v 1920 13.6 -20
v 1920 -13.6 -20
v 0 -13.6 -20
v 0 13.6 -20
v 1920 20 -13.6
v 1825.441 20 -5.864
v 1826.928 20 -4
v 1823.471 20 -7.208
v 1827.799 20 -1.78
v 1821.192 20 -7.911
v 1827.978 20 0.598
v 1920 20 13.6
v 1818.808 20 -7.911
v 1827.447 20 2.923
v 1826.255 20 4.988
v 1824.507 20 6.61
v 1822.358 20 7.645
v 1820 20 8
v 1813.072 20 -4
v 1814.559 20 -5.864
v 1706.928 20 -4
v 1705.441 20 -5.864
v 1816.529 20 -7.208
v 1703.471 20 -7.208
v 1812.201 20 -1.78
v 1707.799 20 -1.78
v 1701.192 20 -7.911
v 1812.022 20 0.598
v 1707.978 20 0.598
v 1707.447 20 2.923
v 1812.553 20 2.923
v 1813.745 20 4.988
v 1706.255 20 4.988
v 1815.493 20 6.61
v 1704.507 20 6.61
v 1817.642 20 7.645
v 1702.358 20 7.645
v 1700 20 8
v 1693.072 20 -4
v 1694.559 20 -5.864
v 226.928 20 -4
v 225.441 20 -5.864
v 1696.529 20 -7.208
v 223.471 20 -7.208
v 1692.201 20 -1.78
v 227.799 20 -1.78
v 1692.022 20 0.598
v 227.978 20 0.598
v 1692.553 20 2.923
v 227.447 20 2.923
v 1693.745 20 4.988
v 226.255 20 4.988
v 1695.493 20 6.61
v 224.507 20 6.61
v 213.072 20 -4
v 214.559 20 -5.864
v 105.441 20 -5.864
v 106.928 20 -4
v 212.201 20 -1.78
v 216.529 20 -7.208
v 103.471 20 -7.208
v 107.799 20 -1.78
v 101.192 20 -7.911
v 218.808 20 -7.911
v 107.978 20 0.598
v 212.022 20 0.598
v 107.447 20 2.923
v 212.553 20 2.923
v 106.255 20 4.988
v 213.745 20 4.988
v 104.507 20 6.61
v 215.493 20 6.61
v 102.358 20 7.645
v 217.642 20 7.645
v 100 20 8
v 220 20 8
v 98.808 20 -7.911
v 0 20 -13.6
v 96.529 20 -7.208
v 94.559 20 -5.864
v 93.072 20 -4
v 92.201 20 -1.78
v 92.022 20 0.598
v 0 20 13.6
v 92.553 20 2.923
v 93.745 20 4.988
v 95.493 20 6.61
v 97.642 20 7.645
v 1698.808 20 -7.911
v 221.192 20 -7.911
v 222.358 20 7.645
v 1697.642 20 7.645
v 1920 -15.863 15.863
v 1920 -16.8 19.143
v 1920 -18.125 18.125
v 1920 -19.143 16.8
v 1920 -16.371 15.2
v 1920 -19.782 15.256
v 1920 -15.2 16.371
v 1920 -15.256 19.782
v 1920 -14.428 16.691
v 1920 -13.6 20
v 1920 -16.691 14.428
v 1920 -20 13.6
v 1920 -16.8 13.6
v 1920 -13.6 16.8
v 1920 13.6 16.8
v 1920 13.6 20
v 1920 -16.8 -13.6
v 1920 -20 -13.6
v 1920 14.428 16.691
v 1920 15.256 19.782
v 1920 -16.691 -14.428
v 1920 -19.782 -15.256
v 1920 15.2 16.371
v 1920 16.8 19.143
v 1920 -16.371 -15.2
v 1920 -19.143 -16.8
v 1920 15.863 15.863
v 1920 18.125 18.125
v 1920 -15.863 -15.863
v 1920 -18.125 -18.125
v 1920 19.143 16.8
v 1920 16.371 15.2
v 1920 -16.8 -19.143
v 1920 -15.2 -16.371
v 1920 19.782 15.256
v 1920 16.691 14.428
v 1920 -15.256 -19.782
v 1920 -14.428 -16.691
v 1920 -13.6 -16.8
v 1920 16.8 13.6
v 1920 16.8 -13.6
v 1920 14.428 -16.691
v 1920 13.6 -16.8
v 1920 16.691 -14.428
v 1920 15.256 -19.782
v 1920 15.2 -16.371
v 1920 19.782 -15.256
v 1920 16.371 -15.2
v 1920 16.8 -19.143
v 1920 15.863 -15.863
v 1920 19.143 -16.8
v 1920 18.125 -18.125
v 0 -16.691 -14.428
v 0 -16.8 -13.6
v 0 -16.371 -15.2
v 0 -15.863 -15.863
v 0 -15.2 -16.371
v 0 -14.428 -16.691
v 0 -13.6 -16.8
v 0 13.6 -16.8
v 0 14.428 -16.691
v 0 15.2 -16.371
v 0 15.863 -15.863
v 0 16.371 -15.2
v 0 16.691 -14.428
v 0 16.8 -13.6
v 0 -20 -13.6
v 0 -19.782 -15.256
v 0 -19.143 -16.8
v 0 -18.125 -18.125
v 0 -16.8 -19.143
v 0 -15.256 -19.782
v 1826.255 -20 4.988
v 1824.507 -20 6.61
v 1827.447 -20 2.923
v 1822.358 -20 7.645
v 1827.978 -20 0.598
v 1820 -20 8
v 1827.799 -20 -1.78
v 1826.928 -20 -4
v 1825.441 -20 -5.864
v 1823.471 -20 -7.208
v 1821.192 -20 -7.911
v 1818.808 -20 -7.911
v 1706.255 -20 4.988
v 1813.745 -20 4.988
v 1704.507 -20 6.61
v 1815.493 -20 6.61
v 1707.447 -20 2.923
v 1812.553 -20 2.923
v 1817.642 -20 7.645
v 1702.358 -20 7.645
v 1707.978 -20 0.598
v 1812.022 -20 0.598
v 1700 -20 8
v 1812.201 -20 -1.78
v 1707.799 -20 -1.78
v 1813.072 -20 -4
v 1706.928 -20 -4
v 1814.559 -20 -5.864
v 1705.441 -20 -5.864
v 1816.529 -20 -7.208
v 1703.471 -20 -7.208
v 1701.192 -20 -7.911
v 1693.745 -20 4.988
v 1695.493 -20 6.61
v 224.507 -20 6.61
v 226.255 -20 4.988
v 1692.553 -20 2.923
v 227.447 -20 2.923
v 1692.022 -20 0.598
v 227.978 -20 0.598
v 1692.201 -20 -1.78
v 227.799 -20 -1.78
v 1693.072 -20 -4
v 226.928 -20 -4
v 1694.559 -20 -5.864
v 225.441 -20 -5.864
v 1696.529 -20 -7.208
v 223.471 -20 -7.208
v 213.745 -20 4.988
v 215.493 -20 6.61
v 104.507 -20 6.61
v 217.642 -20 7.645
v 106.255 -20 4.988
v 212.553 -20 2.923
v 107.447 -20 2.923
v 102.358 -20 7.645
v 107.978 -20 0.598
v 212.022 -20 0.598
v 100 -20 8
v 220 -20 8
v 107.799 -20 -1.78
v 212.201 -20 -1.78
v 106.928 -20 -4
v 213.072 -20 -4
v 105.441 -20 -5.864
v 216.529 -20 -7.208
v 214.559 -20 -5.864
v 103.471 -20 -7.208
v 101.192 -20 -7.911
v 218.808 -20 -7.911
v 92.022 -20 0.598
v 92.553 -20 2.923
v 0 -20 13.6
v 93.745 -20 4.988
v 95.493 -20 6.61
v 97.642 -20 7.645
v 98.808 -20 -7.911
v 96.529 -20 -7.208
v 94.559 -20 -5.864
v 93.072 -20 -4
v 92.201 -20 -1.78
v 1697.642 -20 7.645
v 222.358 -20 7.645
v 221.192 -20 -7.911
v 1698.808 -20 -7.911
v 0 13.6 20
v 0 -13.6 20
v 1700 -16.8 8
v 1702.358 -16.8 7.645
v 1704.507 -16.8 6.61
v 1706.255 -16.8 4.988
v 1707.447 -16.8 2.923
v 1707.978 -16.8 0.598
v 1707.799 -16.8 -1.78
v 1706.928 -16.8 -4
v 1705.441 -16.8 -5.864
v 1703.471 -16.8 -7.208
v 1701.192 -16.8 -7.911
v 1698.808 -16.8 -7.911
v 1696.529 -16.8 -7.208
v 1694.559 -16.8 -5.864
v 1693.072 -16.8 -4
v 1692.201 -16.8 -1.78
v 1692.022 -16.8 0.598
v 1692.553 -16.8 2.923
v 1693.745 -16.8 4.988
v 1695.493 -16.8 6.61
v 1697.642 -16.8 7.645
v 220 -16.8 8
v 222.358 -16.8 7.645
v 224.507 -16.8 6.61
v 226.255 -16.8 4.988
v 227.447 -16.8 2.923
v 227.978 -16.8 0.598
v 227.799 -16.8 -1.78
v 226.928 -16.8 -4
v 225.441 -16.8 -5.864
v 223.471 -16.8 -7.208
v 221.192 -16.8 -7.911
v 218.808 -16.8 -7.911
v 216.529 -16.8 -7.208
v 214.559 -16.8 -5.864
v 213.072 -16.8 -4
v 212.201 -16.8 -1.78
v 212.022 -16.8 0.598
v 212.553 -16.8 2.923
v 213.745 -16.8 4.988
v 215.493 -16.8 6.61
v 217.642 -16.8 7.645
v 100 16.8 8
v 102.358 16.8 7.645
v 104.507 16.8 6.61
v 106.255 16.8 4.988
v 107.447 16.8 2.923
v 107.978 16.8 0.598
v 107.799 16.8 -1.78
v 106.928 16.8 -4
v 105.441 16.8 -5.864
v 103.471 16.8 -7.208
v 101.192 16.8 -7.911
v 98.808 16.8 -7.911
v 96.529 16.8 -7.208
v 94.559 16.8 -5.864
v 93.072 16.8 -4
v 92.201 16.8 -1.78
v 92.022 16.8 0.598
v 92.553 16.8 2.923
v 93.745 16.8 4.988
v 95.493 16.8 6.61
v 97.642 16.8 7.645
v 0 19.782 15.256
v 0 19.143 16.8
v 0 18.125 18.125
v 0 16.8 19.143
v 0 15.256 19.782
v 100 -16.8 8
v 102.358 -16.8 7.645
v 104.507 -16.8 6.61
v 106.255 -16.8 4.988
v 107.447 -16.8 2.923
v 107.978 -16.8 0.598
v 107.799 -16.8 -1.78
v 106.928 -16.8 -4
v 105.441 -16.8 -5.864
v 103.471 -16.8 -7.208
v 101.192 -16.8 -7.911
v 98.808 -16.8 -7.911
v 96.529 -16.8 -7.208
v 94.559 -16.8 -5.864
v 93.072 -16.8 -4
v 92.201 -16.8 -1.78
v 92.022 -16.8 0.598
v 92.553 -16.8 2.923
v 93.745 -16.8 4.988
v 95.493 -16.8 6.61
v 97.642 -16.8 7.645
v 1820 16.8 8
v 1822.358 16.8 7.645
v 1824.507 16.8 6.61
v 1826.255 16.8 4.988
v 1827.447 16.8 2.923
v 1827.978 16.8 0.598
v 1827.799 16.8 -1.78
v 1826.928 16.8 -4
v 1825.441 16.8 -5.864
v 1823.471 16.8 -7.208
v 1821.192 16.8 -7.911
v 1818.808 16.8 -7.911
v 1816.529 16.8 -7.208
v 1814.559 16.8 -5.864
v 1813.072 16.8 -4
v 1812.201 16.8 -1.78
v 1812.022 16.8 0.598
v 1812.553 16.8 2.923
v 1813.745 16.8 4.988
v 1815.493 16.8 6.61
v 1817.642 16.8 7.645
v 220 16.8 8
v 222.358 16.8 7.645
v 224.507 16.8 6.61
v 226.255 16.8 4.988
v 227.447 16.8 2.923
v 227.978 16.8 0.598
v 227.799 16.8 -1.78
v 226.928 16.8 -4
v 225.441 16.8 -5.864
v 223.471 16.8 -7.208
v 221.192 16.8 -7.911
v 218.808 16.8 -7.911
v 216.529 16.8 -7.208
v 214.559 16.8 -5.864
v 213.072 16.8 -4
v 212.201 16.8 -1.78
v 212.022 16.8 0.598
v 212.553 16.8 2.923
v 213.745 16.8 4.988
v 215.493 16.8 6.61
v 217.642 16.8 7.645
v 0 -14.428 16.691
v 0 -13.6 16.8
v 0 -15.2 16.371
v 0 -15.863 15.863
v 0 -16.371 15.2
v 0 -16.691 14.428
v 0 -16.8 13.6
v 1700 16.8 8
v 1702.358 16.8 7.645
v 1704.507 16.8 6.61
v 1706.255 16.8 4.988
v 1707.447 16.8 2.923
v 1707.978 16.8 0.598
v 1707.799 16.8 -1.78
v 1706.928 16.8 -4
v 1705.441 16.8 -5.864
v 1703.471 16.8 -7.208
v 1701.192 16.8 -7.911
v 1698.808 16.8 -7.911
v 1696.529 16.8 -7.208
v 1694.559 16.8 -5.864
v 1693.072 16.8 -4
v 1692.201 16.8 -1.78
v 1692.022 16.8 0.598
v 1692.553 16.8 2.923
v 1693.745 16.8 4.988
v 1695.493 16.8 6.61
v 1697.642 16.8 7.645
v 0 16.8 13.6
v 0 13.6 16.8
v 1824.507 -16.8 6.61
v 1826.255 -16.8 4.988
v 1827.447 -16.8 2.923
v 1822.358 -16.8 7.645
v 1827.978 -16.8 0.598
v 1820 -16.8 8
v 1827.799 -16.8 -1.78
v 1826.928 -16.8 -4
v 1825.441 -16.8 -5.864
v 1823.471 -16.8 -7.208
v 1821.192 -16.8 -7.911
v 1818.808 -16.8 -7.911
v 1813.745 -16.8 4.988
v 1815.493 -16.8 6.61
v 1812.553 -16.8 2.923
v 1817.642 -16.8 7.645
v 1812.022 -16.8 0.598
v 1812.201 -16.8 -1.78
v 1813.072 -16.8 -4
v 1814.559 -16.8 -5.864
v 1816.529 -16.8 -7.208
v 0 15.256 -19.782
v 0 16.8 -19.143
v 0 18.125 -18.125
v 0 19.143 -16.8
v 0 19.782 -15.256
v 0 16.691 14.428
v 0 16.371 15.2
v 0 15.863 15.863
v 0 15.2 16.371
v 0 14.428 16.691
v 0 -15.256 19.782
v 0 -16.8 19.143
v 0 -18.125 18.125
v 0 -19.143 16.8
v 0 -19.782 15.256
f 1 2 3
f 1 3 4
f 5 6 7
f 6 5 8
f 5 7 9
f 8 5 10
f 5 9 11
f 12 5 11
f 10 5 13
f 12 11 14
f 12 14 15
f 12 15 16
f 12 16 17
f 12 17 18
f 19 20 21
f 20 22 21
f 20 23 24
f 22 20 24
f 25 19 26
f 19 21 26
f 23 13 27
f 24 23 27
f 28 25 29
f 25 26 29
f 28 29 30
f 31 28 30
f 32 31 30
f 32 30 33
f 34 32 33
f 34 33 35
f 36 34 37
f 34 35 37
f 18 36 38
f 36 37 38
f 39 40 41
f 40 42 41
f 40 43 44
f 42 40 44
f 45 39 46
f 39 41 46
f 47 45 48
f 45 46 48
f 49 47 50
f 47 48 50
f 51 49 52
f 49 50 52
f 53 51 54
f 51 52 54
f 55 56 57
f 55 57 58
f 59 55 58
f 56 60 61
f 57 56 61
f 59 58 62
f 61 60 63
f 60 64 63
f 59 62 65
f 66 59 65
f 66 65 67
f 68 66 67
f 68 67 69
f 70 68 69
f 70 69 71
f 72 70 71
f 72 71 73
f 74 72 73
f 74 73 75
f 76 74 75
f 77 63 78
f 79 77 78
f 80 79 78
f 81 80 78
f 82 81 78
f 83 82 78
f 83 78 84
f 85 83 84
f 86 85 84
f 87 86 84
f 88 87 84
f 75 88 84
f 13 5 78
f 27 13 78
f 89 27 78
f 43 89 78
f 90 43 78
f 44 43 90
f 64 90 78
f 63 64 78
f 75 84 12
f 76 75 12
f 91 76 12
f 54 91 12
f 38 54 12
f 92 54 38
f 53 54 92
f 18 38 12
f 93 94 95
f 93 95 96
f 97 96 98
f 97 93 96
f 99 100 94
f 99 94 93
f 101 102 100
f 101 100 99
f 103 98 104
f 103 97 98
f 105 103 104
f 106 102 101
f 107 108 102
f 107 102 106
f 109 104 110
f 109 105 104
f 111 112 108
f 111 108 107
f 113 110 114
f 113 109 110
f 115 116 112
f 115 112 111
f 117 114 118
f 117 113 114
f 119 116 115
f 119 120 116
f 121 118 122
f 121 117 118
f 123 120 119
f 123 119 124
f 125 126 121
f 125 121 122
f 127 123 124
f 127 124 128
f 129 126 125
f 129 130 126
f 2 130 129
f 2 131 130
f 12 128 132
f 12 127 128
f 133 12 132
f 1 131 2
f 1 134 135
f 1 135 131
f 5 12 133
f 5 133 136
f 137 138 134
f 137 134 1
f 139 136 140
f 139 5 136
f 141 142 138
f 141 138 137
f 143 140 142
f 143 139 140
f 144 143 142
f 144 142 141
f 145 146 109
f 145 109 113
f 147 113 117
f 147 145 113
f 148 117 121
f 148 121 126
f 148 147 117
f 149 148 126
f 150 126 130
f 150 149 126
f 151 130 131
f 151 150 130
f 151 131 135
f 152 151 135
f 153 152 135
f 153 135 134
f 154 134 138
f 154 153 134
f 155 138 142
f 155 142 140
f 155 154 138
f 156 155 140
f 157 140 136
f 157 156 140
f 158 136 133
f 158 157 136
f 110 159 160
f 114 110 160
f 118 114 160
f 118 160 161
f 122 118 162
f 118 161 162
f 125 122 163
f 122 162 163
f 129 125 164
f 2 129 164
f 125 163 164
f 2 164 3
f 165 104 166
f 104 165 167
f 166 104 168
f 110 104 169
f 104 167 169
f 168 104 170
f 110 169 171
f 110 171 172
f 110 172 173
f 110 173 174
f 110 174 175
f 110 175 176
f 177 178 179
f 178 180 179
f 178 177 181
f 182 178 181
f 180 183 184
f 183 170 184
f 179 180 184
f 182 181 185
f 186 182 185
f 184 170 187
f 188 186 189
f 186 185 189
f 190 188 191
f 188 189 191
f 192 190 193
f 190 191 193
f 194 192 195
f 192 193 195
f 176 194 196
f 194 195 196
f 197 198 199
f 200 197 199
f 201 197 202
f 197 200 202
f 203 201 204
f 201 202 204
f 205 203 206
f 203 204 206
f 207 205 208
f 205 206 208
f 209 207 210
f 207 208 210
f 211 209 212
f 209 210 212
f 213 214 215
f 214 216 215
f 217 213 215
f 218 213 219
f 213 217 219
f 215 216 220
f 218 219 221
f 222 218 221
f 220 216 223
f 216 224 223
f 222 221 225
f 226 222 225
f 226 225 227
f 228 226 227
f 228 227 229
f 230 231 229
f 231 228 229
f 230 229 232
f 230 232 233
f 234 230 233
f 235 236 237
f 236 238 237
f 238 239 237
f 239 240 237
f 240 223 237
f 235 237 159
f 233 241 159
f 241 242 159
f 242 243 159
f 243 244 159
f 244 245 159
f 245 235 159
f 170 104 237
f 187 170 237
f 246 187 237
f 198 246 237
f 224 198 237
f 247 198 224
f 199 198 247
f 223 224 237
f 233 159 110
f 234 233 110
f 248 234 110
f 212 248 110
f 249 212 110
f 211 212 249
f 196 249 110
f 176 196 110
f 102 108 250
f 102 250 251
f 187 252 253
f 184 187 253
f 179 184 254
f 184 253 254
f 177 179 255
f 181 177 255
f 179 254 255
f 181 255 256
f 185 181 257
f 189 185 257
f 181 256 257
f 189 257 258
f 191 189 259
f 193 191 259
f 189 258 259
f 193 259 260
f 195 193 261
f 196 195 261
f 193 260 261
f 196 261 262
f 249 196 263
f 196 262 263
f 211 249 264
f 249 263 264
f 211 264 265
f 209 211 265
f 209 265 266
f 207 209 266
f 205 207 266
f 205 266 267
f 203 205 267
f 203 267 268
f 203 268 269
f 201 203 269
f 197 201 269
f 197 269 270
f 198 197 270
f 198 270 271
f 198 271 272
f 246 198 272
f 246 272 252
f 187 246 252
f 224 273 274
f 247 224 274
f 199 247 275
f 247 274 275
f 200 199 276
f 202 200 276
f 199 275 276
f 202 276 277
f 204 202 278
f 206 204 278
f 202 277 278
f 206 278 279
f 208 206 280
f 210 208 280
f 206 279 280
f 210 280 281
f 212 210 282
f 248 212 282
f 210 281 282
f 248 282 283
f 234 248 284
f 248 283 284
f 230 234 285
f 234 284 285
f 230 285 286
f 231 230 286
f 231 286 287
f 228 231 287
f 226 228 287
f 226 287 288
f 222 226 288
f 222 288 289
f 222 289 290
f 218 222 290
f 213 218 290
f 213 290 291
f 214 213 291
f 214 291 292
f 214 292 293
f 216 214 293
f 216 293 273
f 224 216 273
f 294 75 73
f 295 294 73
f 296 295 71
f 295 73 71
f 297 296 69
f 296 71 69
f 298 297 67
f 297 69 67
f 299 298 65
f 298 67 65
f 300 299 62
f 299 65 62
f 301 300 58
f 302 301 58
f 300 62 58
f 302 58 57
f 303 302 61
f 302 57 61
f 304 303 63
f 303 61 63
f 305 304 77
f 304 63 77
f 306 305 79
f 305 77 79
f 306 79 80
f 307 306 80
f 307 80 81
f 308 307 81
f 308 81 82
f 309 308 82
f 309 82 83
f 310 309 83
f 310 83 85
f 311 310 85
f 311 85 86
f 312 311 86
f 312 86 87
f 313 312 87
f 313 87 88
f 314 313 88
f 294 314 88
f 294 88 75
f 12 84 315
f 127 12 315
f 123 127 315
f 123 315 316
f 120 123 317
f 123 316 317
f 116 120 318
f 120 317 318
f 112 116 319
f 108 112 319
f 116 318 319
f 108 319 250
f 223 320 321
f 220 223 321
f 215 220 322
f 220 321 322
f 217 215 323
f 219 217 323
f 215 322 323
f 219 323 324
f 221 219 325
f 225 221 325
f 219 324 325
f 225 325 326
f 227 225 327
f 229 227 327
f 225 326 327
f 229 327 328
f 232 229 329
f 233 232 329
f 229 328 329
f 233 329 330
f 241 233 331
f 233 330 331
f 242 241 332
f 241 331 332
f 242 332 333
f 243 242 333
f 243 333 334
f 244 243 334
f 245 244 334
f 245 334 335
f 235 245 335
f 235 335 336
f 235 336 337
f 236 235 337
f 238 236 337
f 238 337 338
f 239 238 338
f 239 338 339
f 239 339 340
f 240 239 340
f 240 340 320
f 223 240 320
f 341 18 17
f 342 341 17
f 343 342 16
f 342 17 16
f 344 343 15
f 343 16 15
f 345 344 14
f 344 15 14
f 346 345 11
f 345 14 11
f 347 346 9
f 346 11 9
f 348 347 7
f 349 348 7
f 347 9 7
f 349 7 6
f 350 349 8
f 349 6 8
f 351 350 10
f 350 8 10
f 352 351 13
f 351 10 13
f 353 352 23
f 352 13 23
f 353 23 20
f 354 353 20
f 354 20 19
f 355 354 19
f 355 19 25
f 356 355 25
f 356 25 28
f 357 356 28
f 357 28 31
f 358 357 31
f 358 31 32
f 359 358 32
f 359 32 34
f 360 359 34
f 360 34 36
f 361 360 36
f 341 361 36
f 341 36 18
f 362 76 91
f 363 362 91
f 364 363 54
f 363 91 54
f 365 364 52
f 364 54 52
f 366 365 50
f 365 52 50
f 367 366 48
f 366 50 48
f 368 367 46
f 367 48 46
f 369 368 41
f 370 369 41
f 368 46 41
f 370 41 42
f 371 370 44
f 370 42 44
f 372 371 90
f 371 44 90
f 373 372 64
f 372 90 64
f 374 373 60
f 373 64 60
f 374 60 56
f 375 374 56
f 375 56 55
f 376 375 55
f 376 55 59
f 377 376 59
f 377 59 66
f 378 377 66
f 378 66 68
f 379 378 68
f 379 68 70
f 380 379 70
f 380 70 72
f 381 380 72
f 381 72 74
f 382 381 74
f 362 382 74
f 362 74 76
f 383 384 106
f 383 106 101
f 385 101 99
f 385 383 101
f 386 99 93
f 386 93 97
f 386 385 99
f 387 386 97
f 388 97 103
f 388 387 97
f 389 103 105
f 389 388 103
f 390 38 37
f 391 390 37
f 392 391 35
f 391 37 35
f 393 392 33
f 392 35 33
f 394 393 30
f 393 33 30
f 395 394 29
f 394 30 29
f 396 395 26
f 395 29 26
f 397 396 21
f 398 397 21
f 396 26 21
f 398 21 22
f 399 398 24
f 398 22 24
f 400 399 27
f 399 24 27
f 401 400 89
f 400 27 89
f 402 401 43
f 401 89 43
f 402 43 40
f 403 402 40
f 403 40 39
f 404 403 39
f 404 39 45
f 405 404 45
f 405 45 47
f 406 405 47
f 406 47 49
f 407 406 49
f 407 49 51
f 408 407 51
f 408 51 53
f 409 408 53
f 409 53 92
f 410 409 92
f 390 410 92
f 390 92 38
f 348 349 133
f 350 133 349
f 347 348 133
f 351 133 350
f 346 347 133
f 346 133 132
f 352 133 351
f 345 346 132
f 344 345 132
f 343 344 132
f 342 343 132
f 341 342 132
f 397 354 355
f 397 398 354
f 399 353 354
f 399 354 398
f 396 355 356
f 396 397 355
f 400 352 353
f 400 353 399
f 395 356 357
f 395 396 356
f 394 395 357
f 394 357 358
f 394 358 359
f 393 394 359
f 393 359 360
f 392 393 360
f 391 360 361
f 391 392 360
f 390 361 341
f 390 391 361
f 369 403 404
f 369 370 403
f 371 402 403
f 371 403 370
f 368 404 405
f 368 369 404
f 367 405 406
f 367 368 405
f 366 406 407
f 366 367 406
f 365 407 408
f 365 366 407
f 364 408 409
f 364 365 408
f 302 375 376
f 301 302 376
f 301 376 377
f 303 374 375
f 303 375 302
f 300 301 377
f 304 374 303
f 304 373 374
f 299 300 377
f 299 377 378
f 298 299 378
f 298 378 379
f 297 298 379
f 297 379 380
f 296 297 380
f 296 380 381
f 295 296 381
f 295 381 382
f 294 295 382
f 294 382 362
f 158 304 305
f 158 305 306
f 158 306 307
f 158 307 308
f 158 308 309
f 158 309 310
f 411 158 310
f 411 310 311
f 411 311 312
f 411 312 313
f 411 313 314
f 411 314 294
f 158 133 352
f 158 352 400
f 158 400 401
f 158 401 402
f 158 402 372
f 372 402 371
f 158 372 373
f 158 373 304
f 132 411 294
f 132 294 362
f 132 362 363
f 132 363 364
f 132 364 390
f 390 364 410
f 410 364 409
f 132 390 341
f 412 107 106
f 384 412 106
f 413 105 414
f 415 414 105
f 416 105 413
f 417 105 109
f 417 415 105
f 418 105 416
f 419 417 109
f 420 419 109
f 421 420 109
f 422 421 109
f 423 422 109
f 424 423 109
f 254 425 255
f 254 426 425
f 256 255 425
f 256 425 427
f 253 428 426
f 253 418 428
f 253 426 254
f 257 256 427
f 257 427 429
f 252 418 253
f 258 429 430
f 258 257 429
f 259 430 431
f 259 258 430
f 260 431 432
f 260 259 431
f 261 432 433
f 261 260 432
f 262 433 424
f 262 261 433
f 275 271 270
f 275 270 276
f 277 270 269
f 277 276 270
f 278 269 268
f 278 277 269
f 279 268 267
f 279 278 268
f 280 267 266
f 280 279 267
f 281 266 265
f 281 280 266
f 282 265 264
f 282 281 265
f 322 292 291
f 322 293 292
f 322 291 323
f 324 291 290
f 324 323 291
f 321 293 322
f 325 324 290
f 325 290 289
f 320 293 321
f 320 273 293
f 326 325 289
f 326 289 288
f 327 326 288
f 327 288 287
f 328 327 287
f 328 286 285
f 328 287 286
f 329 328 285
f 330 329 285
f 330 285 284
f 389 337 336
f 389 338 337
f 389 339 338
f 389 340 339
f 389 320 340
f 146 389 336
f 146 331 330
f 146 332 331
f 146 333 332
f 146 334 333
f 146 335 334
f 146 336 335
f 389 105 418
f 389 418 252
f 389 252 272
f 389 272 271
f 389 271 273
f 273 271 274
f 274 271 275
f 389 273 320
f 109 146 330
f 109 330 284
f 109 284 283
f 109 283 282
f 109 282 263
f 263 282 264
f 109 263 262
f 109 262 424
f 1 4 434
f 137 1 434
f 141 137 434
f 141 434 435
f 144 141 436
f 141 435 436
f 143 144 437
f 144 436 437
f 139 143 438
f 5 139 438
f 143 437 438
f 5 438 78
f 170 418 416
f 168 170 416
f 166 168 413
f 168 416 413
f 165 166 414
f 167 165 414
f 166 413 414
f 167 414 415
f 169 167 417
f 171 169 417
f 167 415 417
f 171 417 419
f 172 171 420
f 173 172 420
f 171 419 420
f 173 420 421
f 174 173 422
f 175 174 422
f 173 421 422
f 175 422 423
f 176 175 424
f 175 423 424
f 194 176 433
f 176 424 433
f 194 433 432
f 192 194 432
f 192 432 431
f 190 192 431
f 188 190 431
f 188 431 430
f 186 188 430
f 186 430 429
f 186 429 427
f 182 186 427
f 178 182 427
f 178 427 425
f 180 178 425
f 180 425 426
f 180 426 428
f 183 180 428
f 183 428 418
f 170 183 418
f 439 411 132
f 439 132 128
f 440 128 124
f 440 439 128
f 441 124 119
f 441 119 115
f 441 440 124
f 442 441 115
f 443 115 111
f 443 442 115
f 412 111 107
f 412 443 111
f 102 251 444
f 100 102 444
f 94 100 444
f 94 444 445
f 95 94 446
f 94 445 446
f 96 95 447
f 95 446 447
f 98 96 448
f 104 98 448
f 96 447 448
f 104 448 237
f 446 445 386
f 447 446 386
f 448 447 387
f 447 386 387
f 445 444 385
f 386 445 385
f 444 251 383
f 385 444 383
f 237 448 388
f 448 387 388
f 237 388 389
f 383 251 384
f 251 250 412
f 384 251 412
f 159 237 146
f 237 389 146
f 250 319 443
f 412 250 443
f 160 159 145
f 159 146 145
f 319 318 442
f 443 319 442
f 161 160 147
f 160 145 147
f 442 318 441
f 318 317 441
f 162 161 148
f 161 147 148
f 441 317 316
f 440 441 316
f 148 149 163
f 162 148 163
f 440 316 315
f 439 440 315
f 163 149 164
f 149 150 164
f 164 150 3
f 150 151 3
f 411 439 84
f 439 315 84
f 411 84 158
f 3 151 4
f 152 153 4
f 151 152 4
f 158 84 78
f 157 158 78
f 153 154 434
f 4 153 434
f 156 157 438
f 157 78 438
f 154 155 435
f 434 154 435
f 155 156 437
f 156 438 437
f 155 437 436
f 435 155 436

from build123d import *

# Parameters (mm, degrees)
TUBE_SQUARE_40_X_40_X_3_2_3_DEPTH = 1920
SKETCH13_R                        = 8
CUT_EXTRUDE1_DEPTH                = 1921.52076271


with BuildPart() as part:
    # Sketch12 → Tube (square) 40 X 40 X 3.2(3) (new body)
    with BuildSketch(Plane(origin=(0, 0, 0), x_dir=(0, 0, -1), z_dir=(1, 0, 0))):
        with BuildLine():
            Line((-13.6, -20), (13.6, -20))
            ThreePointArc((13.6, -20), (18.1254834, -18.1254834), (20, -13.6))
            Line((20, -13.6), (20, 13.6))
            ThreePointArc((20, 13.6), (18.1254834, 18.1254834), (13.6, 20))
            Line((13.6, 20), (-13.6, 20))
            ThreePointArc((-13.6, 20), (-18.1254834, 18.1254834), (-20, 13.6))
            Line((-20, 13.6), (-20, -13.6))
            ThreePointArc((-20, -13.6), (-18.1254834, -18.1254834), (-13.6, -20))
        make_face()
        with BuildLine():
            Line((-13.6, -16.8), (13.6, -16.8))
            ThreePointArc((13.6, -16.8), (15.8627417, -15.8627417), (16.8, -13.6))
            Line((16.8, -13.6), (16.8, 13.6))
            ThreePointArc((16.8, 13.6), (15.8627417, 15.8627417), (13.6, 16.8))
            Line((13.6, 16.8), (-13.6, 16.8))
            ThreePointArc((-13.6, 16.8), (-15.8627417, 15.8627417), (-16.8, 13.6))
            Line((-16.8, 13.6), (-16.8, -13.6))
            ThreePointArc((-16.8, -13.6), (-15.8627417, -15.8627417), (-13.6, -16.8))
        make_face(mode=Mode.SUBTRACT)
    extrude(amount=TUBE_SQUARE_40_X_40_X_3_2_3_DEPTH)

    # Sketch13 → Cut-Extrude1 (cut, through all)
    with BuildSketch(Plane(origin=(0, 20, 0), x_dir=(1, 0, 0), z_dir=(0, 1, 0))):
        with Locations(Location((220, 0, 0), (0, 0, 270))):
            Circle(SKETCH13_R)
        with Locations(Location((1700, 0, 0), (0, 0, 270))):
            Circle(SKETCH13_R)
        with Locations(Location((100, 0, 0), (0, 0, 270))):
            Circle(SKETCH13_R)
        with Locations(Location((1820, 0, 0), (0, 0, 270))):
            Circle(SKETCH13_R)
    extrude(amount=-CUT_EXTRUDE1_DEPTH, mode=Mode.SUBTRACT)


solid = part.part
